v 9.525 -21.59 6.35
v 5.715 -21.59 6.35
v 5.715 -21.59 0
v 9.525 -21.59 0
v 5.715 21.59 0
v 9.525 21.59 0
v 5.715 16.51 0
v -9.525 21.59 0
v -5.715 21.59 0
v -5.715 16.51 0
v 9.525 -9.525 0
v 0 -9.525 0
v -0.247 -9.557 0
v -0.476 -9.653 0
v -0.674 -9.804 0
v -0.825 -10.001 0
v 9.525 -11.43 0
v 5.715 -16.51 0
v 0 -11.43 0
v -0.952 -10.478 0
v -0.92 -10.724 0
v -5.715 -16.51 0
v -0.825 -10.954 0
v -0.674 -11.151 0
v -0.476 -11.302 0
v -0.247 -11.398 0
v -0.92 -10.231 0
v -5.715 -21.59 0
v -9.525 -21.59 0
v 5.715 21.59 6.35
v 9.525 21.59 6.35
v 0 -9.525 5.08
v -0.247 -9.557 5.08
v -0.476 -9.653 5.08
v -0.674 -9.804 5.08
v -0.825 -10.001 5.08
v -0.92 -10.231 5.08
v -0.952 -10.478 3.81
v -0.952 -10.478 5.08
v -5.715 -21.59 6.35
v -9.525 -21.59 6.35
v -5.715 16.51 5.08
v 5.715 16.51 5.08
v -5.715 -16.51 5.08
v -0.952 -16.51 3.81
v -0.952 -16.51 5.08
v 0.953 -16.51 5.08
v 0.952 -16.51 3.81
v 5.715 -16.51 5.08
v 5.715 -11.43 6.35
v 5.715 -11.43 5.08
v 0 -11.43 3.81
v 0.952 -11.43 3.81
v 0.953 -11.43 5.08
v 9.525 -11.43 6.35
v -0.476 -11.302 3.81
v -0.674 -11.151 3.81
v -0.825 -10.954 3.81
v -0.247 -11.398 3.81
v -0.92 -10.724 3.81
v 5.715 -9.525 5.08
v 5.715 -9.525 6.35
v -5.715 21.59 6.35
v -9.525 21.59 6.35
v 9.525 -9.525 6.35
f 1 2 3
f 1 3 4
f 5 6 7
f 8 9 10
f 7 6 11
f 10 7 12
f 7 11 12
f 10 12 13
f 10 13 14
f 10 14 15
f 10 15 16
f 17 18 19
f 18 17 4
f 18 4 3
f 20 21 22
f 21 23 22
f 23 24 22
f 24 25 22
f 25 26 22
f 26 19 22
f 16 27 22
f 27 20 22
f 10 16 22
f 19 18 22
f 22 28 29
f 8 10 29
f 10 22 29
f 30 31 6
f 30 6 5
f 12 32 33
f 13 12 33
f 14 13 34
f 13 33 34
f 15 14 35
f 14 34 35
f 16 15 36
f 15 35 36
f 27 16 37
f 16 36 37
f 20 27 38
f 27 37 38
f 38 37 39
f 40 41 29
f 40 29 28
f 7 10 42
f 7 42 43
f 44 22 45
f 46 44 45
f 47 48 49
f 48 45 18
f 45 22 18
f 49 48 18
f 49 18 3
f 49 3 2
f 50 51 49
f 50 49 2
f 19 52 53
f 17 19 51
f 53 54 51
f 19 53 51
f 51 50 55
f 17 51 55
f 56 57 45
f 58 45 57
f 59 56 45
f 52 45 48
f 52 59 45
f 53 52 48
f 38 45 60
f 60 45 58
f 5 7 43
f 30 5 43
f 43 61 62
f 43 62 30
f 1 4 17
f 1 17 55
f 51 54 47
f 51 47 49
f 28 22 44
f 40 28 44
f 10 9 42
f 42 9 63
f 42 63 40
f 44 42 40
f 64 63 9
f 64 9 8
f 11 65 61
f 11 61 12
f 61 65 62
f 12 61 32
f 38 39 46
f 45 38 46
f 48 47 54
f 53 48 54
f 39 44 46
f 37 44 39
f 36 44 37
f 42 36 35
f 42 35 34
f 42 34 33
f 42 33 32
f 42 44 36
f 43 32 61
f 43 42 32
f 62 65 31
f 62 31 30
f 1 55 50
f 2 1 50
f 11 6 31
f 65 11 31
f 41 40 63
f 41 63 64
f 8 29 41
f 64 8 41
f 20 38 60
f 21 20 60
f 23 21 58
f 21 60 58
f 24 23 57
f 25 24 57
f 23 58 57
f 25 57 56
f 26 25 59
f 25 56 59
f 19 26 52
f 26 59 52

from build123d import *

# Parameters (mm, degrees)
F0_W     = 19.05
F0_H     = 33.02
F1_DEPTH = 6.35
F2_W     = 3.81
F2_H     = 6.35
F3_DEPTH = 5.08
F4_W     = 3.81
F4_H     = 6.35
F5_DEPTH = 5.08
F7_DEPTH = 2.54
F6_W     = 3.81
F6_H     = 1.905
F8_DEPTH = 6.35
F6_W_2   = 4.7625
F6_H_2   = 5.08
F9_DEPTH = 1.27


with BuildPart() as f1:
    # F0 (on Top) → F1 (new body)
    with BuildSketch(Plane.XY):
        Rectangle(F0_W, F0_H)
    extrude(amount=F1_DEPTH)

    # F2 (on face) → F3 (join)
    with BuildSketch(Plane.XZ.offset(16.51)):
        with Locations((-7.62, 3.175)):
            Rectangle(F2_W, F2_H)
        with Locations((7.62, 3.175)):
            Rectangle(F2_W, F2_H)
    extrude(amount=F3_DEPTH)

    # F4 (on face) → F5 (join)
    with BuildSketch(Plane(origin=(0, 16.51, 0), x_dir=(-1, 0, 0), z_dir=(0, 1, 0))):
        with Locations((-7.62, 3.175)):
            Rectangle(F4_W, F4_H)
        with Locations((7.62, 3.175)):
            Rectangle(F4_W, F4_H)
    extrude(amount=F5_DEPTH)

    # F6 (on face) → F7 (cut)
    with BuildSketch(Plane.XY.offset(6.35)):
        with BuildLine():
            Line((-0.9525, -16.51), (0.9525, -16.51))
            Line((0.9525, -16.51), (0.9525, -11.43))
            Line((0.9525, -11.43), (0, -11.43))
            ThreePointArc((0, -11.43), (-0.6735192091, -11.1510192091), (-0.9525, -10.4775))
            Line((-0.9525, -10.4775), (-0.9525, -16.51))
        make_face()
        with BuildLine():
            Line((0, -11.43), (0.9525, -11.43))
            Line((0.9525, -11.43), (0.9525, -10.4775))
            ThreePointArc((0.9525, -10.4775), (0.6735192091, -11.1510192091), (0, -11.43))
        make_face()
    extrude(amount=-F7_DEPTH, mode=Mode.SUBTRACT)

    # F6 (on face) → F8 (cut)
    with BuildSketch(Plane.XY.offset(6.35)):
        with BuildLine():
            Line((0, -10.4775), (0, -9.525))
            ThreePointArc((0, -9.525), (-0.6735192091, -9.8039807909), (-0.9525, -10.4775))
            Line((-0.9525, -10.4775), (0, -10.4775))
        make_face()
        with BuildLine():
            ThreePointArc((-0.9525, -10.4775), (-0.6735192091, -11.1510192091), (0, -11.43))
            Line((0, -11.43), (0, -10.4775))
            Line((0, -10.4775), (-0.9525, -10.4775))
        make_face()
        with BuildLine():
            ThreePointArc((0.9525, -10.4775), (0.6735192091, -9.8039807909), (0, -9.525))
            Line((0, -9.525), (0, -10.4775))
            Line((0, -10.4775), (0.9525, -10.4775))
        make_face()
        with BuildLine():
            Line((0, -10.4775), (0, -11.43))
            ThreePointArc((0, -11.43), (0.6735192091, -11.1510192091), (0.9525, -10.4775))
            Line((0.9525, -10.4775), (0, -10.4775))
        make_face()
        with BuildLine():
            Line((0.9525, -11.43), (5.715, -11.43))
            Line((5.715, -11.43), (5.715, -9.525))
            Line((5.715, -9.525), (0, -9.525))
            ThreePointArc((0, -9.525), (0.6735192091, -9.8039807909), (0.9525, -10.4775))
            Line((0.9525, -10.4775), (0.9525, -11.43))
        make_face()
        with Locations((7.62, -10.4775)):
            Rectangle(F6_W, F6_H)
        with BuildLine():
            Line((0, -11.43), (0.9525, -11.43))
            Line((0.9525, -11.43), (0.9525, -10.4775))
            ThreePointArc((0.9525, -10.4775), (0.6735192091, -11.1510192091), (0, -11.43))
        make_face()
    extrude(amount=-F8_DEPTH, mode=Mode.SUBTRACT)

    # F6 (on face) → F9 (cut)
    with BuildSketch(Plane.XY.offset(6.35)):
        with BuildLine():
            Line((0, -9.525), (5.715, -9.525))
            Line((5.715, -9.525), (5.715, 16.51))
            Line((5.715, 16.51), (-5.715, 16.51))
            Line((-5.715, 16.51), (-5.715, -16.51))
            Line((-5.715, -16.51), (-0.9525, -16.51))
            Line((-0.9525, -16.51), (-0.9525, -10.4775))
            ThreePointArc((-0.9525, -10.4775), (-0.6735192091, -9.8039807909), (0, -9.525))
        make_face()
        with Locations((3.33375, -13.97)):
            Rectangle(F6_W_2, F6_H_2)
    extrude(amount=-F9_DEPTH, mode=Mode.SUBTRACT)


solid = f1.part
